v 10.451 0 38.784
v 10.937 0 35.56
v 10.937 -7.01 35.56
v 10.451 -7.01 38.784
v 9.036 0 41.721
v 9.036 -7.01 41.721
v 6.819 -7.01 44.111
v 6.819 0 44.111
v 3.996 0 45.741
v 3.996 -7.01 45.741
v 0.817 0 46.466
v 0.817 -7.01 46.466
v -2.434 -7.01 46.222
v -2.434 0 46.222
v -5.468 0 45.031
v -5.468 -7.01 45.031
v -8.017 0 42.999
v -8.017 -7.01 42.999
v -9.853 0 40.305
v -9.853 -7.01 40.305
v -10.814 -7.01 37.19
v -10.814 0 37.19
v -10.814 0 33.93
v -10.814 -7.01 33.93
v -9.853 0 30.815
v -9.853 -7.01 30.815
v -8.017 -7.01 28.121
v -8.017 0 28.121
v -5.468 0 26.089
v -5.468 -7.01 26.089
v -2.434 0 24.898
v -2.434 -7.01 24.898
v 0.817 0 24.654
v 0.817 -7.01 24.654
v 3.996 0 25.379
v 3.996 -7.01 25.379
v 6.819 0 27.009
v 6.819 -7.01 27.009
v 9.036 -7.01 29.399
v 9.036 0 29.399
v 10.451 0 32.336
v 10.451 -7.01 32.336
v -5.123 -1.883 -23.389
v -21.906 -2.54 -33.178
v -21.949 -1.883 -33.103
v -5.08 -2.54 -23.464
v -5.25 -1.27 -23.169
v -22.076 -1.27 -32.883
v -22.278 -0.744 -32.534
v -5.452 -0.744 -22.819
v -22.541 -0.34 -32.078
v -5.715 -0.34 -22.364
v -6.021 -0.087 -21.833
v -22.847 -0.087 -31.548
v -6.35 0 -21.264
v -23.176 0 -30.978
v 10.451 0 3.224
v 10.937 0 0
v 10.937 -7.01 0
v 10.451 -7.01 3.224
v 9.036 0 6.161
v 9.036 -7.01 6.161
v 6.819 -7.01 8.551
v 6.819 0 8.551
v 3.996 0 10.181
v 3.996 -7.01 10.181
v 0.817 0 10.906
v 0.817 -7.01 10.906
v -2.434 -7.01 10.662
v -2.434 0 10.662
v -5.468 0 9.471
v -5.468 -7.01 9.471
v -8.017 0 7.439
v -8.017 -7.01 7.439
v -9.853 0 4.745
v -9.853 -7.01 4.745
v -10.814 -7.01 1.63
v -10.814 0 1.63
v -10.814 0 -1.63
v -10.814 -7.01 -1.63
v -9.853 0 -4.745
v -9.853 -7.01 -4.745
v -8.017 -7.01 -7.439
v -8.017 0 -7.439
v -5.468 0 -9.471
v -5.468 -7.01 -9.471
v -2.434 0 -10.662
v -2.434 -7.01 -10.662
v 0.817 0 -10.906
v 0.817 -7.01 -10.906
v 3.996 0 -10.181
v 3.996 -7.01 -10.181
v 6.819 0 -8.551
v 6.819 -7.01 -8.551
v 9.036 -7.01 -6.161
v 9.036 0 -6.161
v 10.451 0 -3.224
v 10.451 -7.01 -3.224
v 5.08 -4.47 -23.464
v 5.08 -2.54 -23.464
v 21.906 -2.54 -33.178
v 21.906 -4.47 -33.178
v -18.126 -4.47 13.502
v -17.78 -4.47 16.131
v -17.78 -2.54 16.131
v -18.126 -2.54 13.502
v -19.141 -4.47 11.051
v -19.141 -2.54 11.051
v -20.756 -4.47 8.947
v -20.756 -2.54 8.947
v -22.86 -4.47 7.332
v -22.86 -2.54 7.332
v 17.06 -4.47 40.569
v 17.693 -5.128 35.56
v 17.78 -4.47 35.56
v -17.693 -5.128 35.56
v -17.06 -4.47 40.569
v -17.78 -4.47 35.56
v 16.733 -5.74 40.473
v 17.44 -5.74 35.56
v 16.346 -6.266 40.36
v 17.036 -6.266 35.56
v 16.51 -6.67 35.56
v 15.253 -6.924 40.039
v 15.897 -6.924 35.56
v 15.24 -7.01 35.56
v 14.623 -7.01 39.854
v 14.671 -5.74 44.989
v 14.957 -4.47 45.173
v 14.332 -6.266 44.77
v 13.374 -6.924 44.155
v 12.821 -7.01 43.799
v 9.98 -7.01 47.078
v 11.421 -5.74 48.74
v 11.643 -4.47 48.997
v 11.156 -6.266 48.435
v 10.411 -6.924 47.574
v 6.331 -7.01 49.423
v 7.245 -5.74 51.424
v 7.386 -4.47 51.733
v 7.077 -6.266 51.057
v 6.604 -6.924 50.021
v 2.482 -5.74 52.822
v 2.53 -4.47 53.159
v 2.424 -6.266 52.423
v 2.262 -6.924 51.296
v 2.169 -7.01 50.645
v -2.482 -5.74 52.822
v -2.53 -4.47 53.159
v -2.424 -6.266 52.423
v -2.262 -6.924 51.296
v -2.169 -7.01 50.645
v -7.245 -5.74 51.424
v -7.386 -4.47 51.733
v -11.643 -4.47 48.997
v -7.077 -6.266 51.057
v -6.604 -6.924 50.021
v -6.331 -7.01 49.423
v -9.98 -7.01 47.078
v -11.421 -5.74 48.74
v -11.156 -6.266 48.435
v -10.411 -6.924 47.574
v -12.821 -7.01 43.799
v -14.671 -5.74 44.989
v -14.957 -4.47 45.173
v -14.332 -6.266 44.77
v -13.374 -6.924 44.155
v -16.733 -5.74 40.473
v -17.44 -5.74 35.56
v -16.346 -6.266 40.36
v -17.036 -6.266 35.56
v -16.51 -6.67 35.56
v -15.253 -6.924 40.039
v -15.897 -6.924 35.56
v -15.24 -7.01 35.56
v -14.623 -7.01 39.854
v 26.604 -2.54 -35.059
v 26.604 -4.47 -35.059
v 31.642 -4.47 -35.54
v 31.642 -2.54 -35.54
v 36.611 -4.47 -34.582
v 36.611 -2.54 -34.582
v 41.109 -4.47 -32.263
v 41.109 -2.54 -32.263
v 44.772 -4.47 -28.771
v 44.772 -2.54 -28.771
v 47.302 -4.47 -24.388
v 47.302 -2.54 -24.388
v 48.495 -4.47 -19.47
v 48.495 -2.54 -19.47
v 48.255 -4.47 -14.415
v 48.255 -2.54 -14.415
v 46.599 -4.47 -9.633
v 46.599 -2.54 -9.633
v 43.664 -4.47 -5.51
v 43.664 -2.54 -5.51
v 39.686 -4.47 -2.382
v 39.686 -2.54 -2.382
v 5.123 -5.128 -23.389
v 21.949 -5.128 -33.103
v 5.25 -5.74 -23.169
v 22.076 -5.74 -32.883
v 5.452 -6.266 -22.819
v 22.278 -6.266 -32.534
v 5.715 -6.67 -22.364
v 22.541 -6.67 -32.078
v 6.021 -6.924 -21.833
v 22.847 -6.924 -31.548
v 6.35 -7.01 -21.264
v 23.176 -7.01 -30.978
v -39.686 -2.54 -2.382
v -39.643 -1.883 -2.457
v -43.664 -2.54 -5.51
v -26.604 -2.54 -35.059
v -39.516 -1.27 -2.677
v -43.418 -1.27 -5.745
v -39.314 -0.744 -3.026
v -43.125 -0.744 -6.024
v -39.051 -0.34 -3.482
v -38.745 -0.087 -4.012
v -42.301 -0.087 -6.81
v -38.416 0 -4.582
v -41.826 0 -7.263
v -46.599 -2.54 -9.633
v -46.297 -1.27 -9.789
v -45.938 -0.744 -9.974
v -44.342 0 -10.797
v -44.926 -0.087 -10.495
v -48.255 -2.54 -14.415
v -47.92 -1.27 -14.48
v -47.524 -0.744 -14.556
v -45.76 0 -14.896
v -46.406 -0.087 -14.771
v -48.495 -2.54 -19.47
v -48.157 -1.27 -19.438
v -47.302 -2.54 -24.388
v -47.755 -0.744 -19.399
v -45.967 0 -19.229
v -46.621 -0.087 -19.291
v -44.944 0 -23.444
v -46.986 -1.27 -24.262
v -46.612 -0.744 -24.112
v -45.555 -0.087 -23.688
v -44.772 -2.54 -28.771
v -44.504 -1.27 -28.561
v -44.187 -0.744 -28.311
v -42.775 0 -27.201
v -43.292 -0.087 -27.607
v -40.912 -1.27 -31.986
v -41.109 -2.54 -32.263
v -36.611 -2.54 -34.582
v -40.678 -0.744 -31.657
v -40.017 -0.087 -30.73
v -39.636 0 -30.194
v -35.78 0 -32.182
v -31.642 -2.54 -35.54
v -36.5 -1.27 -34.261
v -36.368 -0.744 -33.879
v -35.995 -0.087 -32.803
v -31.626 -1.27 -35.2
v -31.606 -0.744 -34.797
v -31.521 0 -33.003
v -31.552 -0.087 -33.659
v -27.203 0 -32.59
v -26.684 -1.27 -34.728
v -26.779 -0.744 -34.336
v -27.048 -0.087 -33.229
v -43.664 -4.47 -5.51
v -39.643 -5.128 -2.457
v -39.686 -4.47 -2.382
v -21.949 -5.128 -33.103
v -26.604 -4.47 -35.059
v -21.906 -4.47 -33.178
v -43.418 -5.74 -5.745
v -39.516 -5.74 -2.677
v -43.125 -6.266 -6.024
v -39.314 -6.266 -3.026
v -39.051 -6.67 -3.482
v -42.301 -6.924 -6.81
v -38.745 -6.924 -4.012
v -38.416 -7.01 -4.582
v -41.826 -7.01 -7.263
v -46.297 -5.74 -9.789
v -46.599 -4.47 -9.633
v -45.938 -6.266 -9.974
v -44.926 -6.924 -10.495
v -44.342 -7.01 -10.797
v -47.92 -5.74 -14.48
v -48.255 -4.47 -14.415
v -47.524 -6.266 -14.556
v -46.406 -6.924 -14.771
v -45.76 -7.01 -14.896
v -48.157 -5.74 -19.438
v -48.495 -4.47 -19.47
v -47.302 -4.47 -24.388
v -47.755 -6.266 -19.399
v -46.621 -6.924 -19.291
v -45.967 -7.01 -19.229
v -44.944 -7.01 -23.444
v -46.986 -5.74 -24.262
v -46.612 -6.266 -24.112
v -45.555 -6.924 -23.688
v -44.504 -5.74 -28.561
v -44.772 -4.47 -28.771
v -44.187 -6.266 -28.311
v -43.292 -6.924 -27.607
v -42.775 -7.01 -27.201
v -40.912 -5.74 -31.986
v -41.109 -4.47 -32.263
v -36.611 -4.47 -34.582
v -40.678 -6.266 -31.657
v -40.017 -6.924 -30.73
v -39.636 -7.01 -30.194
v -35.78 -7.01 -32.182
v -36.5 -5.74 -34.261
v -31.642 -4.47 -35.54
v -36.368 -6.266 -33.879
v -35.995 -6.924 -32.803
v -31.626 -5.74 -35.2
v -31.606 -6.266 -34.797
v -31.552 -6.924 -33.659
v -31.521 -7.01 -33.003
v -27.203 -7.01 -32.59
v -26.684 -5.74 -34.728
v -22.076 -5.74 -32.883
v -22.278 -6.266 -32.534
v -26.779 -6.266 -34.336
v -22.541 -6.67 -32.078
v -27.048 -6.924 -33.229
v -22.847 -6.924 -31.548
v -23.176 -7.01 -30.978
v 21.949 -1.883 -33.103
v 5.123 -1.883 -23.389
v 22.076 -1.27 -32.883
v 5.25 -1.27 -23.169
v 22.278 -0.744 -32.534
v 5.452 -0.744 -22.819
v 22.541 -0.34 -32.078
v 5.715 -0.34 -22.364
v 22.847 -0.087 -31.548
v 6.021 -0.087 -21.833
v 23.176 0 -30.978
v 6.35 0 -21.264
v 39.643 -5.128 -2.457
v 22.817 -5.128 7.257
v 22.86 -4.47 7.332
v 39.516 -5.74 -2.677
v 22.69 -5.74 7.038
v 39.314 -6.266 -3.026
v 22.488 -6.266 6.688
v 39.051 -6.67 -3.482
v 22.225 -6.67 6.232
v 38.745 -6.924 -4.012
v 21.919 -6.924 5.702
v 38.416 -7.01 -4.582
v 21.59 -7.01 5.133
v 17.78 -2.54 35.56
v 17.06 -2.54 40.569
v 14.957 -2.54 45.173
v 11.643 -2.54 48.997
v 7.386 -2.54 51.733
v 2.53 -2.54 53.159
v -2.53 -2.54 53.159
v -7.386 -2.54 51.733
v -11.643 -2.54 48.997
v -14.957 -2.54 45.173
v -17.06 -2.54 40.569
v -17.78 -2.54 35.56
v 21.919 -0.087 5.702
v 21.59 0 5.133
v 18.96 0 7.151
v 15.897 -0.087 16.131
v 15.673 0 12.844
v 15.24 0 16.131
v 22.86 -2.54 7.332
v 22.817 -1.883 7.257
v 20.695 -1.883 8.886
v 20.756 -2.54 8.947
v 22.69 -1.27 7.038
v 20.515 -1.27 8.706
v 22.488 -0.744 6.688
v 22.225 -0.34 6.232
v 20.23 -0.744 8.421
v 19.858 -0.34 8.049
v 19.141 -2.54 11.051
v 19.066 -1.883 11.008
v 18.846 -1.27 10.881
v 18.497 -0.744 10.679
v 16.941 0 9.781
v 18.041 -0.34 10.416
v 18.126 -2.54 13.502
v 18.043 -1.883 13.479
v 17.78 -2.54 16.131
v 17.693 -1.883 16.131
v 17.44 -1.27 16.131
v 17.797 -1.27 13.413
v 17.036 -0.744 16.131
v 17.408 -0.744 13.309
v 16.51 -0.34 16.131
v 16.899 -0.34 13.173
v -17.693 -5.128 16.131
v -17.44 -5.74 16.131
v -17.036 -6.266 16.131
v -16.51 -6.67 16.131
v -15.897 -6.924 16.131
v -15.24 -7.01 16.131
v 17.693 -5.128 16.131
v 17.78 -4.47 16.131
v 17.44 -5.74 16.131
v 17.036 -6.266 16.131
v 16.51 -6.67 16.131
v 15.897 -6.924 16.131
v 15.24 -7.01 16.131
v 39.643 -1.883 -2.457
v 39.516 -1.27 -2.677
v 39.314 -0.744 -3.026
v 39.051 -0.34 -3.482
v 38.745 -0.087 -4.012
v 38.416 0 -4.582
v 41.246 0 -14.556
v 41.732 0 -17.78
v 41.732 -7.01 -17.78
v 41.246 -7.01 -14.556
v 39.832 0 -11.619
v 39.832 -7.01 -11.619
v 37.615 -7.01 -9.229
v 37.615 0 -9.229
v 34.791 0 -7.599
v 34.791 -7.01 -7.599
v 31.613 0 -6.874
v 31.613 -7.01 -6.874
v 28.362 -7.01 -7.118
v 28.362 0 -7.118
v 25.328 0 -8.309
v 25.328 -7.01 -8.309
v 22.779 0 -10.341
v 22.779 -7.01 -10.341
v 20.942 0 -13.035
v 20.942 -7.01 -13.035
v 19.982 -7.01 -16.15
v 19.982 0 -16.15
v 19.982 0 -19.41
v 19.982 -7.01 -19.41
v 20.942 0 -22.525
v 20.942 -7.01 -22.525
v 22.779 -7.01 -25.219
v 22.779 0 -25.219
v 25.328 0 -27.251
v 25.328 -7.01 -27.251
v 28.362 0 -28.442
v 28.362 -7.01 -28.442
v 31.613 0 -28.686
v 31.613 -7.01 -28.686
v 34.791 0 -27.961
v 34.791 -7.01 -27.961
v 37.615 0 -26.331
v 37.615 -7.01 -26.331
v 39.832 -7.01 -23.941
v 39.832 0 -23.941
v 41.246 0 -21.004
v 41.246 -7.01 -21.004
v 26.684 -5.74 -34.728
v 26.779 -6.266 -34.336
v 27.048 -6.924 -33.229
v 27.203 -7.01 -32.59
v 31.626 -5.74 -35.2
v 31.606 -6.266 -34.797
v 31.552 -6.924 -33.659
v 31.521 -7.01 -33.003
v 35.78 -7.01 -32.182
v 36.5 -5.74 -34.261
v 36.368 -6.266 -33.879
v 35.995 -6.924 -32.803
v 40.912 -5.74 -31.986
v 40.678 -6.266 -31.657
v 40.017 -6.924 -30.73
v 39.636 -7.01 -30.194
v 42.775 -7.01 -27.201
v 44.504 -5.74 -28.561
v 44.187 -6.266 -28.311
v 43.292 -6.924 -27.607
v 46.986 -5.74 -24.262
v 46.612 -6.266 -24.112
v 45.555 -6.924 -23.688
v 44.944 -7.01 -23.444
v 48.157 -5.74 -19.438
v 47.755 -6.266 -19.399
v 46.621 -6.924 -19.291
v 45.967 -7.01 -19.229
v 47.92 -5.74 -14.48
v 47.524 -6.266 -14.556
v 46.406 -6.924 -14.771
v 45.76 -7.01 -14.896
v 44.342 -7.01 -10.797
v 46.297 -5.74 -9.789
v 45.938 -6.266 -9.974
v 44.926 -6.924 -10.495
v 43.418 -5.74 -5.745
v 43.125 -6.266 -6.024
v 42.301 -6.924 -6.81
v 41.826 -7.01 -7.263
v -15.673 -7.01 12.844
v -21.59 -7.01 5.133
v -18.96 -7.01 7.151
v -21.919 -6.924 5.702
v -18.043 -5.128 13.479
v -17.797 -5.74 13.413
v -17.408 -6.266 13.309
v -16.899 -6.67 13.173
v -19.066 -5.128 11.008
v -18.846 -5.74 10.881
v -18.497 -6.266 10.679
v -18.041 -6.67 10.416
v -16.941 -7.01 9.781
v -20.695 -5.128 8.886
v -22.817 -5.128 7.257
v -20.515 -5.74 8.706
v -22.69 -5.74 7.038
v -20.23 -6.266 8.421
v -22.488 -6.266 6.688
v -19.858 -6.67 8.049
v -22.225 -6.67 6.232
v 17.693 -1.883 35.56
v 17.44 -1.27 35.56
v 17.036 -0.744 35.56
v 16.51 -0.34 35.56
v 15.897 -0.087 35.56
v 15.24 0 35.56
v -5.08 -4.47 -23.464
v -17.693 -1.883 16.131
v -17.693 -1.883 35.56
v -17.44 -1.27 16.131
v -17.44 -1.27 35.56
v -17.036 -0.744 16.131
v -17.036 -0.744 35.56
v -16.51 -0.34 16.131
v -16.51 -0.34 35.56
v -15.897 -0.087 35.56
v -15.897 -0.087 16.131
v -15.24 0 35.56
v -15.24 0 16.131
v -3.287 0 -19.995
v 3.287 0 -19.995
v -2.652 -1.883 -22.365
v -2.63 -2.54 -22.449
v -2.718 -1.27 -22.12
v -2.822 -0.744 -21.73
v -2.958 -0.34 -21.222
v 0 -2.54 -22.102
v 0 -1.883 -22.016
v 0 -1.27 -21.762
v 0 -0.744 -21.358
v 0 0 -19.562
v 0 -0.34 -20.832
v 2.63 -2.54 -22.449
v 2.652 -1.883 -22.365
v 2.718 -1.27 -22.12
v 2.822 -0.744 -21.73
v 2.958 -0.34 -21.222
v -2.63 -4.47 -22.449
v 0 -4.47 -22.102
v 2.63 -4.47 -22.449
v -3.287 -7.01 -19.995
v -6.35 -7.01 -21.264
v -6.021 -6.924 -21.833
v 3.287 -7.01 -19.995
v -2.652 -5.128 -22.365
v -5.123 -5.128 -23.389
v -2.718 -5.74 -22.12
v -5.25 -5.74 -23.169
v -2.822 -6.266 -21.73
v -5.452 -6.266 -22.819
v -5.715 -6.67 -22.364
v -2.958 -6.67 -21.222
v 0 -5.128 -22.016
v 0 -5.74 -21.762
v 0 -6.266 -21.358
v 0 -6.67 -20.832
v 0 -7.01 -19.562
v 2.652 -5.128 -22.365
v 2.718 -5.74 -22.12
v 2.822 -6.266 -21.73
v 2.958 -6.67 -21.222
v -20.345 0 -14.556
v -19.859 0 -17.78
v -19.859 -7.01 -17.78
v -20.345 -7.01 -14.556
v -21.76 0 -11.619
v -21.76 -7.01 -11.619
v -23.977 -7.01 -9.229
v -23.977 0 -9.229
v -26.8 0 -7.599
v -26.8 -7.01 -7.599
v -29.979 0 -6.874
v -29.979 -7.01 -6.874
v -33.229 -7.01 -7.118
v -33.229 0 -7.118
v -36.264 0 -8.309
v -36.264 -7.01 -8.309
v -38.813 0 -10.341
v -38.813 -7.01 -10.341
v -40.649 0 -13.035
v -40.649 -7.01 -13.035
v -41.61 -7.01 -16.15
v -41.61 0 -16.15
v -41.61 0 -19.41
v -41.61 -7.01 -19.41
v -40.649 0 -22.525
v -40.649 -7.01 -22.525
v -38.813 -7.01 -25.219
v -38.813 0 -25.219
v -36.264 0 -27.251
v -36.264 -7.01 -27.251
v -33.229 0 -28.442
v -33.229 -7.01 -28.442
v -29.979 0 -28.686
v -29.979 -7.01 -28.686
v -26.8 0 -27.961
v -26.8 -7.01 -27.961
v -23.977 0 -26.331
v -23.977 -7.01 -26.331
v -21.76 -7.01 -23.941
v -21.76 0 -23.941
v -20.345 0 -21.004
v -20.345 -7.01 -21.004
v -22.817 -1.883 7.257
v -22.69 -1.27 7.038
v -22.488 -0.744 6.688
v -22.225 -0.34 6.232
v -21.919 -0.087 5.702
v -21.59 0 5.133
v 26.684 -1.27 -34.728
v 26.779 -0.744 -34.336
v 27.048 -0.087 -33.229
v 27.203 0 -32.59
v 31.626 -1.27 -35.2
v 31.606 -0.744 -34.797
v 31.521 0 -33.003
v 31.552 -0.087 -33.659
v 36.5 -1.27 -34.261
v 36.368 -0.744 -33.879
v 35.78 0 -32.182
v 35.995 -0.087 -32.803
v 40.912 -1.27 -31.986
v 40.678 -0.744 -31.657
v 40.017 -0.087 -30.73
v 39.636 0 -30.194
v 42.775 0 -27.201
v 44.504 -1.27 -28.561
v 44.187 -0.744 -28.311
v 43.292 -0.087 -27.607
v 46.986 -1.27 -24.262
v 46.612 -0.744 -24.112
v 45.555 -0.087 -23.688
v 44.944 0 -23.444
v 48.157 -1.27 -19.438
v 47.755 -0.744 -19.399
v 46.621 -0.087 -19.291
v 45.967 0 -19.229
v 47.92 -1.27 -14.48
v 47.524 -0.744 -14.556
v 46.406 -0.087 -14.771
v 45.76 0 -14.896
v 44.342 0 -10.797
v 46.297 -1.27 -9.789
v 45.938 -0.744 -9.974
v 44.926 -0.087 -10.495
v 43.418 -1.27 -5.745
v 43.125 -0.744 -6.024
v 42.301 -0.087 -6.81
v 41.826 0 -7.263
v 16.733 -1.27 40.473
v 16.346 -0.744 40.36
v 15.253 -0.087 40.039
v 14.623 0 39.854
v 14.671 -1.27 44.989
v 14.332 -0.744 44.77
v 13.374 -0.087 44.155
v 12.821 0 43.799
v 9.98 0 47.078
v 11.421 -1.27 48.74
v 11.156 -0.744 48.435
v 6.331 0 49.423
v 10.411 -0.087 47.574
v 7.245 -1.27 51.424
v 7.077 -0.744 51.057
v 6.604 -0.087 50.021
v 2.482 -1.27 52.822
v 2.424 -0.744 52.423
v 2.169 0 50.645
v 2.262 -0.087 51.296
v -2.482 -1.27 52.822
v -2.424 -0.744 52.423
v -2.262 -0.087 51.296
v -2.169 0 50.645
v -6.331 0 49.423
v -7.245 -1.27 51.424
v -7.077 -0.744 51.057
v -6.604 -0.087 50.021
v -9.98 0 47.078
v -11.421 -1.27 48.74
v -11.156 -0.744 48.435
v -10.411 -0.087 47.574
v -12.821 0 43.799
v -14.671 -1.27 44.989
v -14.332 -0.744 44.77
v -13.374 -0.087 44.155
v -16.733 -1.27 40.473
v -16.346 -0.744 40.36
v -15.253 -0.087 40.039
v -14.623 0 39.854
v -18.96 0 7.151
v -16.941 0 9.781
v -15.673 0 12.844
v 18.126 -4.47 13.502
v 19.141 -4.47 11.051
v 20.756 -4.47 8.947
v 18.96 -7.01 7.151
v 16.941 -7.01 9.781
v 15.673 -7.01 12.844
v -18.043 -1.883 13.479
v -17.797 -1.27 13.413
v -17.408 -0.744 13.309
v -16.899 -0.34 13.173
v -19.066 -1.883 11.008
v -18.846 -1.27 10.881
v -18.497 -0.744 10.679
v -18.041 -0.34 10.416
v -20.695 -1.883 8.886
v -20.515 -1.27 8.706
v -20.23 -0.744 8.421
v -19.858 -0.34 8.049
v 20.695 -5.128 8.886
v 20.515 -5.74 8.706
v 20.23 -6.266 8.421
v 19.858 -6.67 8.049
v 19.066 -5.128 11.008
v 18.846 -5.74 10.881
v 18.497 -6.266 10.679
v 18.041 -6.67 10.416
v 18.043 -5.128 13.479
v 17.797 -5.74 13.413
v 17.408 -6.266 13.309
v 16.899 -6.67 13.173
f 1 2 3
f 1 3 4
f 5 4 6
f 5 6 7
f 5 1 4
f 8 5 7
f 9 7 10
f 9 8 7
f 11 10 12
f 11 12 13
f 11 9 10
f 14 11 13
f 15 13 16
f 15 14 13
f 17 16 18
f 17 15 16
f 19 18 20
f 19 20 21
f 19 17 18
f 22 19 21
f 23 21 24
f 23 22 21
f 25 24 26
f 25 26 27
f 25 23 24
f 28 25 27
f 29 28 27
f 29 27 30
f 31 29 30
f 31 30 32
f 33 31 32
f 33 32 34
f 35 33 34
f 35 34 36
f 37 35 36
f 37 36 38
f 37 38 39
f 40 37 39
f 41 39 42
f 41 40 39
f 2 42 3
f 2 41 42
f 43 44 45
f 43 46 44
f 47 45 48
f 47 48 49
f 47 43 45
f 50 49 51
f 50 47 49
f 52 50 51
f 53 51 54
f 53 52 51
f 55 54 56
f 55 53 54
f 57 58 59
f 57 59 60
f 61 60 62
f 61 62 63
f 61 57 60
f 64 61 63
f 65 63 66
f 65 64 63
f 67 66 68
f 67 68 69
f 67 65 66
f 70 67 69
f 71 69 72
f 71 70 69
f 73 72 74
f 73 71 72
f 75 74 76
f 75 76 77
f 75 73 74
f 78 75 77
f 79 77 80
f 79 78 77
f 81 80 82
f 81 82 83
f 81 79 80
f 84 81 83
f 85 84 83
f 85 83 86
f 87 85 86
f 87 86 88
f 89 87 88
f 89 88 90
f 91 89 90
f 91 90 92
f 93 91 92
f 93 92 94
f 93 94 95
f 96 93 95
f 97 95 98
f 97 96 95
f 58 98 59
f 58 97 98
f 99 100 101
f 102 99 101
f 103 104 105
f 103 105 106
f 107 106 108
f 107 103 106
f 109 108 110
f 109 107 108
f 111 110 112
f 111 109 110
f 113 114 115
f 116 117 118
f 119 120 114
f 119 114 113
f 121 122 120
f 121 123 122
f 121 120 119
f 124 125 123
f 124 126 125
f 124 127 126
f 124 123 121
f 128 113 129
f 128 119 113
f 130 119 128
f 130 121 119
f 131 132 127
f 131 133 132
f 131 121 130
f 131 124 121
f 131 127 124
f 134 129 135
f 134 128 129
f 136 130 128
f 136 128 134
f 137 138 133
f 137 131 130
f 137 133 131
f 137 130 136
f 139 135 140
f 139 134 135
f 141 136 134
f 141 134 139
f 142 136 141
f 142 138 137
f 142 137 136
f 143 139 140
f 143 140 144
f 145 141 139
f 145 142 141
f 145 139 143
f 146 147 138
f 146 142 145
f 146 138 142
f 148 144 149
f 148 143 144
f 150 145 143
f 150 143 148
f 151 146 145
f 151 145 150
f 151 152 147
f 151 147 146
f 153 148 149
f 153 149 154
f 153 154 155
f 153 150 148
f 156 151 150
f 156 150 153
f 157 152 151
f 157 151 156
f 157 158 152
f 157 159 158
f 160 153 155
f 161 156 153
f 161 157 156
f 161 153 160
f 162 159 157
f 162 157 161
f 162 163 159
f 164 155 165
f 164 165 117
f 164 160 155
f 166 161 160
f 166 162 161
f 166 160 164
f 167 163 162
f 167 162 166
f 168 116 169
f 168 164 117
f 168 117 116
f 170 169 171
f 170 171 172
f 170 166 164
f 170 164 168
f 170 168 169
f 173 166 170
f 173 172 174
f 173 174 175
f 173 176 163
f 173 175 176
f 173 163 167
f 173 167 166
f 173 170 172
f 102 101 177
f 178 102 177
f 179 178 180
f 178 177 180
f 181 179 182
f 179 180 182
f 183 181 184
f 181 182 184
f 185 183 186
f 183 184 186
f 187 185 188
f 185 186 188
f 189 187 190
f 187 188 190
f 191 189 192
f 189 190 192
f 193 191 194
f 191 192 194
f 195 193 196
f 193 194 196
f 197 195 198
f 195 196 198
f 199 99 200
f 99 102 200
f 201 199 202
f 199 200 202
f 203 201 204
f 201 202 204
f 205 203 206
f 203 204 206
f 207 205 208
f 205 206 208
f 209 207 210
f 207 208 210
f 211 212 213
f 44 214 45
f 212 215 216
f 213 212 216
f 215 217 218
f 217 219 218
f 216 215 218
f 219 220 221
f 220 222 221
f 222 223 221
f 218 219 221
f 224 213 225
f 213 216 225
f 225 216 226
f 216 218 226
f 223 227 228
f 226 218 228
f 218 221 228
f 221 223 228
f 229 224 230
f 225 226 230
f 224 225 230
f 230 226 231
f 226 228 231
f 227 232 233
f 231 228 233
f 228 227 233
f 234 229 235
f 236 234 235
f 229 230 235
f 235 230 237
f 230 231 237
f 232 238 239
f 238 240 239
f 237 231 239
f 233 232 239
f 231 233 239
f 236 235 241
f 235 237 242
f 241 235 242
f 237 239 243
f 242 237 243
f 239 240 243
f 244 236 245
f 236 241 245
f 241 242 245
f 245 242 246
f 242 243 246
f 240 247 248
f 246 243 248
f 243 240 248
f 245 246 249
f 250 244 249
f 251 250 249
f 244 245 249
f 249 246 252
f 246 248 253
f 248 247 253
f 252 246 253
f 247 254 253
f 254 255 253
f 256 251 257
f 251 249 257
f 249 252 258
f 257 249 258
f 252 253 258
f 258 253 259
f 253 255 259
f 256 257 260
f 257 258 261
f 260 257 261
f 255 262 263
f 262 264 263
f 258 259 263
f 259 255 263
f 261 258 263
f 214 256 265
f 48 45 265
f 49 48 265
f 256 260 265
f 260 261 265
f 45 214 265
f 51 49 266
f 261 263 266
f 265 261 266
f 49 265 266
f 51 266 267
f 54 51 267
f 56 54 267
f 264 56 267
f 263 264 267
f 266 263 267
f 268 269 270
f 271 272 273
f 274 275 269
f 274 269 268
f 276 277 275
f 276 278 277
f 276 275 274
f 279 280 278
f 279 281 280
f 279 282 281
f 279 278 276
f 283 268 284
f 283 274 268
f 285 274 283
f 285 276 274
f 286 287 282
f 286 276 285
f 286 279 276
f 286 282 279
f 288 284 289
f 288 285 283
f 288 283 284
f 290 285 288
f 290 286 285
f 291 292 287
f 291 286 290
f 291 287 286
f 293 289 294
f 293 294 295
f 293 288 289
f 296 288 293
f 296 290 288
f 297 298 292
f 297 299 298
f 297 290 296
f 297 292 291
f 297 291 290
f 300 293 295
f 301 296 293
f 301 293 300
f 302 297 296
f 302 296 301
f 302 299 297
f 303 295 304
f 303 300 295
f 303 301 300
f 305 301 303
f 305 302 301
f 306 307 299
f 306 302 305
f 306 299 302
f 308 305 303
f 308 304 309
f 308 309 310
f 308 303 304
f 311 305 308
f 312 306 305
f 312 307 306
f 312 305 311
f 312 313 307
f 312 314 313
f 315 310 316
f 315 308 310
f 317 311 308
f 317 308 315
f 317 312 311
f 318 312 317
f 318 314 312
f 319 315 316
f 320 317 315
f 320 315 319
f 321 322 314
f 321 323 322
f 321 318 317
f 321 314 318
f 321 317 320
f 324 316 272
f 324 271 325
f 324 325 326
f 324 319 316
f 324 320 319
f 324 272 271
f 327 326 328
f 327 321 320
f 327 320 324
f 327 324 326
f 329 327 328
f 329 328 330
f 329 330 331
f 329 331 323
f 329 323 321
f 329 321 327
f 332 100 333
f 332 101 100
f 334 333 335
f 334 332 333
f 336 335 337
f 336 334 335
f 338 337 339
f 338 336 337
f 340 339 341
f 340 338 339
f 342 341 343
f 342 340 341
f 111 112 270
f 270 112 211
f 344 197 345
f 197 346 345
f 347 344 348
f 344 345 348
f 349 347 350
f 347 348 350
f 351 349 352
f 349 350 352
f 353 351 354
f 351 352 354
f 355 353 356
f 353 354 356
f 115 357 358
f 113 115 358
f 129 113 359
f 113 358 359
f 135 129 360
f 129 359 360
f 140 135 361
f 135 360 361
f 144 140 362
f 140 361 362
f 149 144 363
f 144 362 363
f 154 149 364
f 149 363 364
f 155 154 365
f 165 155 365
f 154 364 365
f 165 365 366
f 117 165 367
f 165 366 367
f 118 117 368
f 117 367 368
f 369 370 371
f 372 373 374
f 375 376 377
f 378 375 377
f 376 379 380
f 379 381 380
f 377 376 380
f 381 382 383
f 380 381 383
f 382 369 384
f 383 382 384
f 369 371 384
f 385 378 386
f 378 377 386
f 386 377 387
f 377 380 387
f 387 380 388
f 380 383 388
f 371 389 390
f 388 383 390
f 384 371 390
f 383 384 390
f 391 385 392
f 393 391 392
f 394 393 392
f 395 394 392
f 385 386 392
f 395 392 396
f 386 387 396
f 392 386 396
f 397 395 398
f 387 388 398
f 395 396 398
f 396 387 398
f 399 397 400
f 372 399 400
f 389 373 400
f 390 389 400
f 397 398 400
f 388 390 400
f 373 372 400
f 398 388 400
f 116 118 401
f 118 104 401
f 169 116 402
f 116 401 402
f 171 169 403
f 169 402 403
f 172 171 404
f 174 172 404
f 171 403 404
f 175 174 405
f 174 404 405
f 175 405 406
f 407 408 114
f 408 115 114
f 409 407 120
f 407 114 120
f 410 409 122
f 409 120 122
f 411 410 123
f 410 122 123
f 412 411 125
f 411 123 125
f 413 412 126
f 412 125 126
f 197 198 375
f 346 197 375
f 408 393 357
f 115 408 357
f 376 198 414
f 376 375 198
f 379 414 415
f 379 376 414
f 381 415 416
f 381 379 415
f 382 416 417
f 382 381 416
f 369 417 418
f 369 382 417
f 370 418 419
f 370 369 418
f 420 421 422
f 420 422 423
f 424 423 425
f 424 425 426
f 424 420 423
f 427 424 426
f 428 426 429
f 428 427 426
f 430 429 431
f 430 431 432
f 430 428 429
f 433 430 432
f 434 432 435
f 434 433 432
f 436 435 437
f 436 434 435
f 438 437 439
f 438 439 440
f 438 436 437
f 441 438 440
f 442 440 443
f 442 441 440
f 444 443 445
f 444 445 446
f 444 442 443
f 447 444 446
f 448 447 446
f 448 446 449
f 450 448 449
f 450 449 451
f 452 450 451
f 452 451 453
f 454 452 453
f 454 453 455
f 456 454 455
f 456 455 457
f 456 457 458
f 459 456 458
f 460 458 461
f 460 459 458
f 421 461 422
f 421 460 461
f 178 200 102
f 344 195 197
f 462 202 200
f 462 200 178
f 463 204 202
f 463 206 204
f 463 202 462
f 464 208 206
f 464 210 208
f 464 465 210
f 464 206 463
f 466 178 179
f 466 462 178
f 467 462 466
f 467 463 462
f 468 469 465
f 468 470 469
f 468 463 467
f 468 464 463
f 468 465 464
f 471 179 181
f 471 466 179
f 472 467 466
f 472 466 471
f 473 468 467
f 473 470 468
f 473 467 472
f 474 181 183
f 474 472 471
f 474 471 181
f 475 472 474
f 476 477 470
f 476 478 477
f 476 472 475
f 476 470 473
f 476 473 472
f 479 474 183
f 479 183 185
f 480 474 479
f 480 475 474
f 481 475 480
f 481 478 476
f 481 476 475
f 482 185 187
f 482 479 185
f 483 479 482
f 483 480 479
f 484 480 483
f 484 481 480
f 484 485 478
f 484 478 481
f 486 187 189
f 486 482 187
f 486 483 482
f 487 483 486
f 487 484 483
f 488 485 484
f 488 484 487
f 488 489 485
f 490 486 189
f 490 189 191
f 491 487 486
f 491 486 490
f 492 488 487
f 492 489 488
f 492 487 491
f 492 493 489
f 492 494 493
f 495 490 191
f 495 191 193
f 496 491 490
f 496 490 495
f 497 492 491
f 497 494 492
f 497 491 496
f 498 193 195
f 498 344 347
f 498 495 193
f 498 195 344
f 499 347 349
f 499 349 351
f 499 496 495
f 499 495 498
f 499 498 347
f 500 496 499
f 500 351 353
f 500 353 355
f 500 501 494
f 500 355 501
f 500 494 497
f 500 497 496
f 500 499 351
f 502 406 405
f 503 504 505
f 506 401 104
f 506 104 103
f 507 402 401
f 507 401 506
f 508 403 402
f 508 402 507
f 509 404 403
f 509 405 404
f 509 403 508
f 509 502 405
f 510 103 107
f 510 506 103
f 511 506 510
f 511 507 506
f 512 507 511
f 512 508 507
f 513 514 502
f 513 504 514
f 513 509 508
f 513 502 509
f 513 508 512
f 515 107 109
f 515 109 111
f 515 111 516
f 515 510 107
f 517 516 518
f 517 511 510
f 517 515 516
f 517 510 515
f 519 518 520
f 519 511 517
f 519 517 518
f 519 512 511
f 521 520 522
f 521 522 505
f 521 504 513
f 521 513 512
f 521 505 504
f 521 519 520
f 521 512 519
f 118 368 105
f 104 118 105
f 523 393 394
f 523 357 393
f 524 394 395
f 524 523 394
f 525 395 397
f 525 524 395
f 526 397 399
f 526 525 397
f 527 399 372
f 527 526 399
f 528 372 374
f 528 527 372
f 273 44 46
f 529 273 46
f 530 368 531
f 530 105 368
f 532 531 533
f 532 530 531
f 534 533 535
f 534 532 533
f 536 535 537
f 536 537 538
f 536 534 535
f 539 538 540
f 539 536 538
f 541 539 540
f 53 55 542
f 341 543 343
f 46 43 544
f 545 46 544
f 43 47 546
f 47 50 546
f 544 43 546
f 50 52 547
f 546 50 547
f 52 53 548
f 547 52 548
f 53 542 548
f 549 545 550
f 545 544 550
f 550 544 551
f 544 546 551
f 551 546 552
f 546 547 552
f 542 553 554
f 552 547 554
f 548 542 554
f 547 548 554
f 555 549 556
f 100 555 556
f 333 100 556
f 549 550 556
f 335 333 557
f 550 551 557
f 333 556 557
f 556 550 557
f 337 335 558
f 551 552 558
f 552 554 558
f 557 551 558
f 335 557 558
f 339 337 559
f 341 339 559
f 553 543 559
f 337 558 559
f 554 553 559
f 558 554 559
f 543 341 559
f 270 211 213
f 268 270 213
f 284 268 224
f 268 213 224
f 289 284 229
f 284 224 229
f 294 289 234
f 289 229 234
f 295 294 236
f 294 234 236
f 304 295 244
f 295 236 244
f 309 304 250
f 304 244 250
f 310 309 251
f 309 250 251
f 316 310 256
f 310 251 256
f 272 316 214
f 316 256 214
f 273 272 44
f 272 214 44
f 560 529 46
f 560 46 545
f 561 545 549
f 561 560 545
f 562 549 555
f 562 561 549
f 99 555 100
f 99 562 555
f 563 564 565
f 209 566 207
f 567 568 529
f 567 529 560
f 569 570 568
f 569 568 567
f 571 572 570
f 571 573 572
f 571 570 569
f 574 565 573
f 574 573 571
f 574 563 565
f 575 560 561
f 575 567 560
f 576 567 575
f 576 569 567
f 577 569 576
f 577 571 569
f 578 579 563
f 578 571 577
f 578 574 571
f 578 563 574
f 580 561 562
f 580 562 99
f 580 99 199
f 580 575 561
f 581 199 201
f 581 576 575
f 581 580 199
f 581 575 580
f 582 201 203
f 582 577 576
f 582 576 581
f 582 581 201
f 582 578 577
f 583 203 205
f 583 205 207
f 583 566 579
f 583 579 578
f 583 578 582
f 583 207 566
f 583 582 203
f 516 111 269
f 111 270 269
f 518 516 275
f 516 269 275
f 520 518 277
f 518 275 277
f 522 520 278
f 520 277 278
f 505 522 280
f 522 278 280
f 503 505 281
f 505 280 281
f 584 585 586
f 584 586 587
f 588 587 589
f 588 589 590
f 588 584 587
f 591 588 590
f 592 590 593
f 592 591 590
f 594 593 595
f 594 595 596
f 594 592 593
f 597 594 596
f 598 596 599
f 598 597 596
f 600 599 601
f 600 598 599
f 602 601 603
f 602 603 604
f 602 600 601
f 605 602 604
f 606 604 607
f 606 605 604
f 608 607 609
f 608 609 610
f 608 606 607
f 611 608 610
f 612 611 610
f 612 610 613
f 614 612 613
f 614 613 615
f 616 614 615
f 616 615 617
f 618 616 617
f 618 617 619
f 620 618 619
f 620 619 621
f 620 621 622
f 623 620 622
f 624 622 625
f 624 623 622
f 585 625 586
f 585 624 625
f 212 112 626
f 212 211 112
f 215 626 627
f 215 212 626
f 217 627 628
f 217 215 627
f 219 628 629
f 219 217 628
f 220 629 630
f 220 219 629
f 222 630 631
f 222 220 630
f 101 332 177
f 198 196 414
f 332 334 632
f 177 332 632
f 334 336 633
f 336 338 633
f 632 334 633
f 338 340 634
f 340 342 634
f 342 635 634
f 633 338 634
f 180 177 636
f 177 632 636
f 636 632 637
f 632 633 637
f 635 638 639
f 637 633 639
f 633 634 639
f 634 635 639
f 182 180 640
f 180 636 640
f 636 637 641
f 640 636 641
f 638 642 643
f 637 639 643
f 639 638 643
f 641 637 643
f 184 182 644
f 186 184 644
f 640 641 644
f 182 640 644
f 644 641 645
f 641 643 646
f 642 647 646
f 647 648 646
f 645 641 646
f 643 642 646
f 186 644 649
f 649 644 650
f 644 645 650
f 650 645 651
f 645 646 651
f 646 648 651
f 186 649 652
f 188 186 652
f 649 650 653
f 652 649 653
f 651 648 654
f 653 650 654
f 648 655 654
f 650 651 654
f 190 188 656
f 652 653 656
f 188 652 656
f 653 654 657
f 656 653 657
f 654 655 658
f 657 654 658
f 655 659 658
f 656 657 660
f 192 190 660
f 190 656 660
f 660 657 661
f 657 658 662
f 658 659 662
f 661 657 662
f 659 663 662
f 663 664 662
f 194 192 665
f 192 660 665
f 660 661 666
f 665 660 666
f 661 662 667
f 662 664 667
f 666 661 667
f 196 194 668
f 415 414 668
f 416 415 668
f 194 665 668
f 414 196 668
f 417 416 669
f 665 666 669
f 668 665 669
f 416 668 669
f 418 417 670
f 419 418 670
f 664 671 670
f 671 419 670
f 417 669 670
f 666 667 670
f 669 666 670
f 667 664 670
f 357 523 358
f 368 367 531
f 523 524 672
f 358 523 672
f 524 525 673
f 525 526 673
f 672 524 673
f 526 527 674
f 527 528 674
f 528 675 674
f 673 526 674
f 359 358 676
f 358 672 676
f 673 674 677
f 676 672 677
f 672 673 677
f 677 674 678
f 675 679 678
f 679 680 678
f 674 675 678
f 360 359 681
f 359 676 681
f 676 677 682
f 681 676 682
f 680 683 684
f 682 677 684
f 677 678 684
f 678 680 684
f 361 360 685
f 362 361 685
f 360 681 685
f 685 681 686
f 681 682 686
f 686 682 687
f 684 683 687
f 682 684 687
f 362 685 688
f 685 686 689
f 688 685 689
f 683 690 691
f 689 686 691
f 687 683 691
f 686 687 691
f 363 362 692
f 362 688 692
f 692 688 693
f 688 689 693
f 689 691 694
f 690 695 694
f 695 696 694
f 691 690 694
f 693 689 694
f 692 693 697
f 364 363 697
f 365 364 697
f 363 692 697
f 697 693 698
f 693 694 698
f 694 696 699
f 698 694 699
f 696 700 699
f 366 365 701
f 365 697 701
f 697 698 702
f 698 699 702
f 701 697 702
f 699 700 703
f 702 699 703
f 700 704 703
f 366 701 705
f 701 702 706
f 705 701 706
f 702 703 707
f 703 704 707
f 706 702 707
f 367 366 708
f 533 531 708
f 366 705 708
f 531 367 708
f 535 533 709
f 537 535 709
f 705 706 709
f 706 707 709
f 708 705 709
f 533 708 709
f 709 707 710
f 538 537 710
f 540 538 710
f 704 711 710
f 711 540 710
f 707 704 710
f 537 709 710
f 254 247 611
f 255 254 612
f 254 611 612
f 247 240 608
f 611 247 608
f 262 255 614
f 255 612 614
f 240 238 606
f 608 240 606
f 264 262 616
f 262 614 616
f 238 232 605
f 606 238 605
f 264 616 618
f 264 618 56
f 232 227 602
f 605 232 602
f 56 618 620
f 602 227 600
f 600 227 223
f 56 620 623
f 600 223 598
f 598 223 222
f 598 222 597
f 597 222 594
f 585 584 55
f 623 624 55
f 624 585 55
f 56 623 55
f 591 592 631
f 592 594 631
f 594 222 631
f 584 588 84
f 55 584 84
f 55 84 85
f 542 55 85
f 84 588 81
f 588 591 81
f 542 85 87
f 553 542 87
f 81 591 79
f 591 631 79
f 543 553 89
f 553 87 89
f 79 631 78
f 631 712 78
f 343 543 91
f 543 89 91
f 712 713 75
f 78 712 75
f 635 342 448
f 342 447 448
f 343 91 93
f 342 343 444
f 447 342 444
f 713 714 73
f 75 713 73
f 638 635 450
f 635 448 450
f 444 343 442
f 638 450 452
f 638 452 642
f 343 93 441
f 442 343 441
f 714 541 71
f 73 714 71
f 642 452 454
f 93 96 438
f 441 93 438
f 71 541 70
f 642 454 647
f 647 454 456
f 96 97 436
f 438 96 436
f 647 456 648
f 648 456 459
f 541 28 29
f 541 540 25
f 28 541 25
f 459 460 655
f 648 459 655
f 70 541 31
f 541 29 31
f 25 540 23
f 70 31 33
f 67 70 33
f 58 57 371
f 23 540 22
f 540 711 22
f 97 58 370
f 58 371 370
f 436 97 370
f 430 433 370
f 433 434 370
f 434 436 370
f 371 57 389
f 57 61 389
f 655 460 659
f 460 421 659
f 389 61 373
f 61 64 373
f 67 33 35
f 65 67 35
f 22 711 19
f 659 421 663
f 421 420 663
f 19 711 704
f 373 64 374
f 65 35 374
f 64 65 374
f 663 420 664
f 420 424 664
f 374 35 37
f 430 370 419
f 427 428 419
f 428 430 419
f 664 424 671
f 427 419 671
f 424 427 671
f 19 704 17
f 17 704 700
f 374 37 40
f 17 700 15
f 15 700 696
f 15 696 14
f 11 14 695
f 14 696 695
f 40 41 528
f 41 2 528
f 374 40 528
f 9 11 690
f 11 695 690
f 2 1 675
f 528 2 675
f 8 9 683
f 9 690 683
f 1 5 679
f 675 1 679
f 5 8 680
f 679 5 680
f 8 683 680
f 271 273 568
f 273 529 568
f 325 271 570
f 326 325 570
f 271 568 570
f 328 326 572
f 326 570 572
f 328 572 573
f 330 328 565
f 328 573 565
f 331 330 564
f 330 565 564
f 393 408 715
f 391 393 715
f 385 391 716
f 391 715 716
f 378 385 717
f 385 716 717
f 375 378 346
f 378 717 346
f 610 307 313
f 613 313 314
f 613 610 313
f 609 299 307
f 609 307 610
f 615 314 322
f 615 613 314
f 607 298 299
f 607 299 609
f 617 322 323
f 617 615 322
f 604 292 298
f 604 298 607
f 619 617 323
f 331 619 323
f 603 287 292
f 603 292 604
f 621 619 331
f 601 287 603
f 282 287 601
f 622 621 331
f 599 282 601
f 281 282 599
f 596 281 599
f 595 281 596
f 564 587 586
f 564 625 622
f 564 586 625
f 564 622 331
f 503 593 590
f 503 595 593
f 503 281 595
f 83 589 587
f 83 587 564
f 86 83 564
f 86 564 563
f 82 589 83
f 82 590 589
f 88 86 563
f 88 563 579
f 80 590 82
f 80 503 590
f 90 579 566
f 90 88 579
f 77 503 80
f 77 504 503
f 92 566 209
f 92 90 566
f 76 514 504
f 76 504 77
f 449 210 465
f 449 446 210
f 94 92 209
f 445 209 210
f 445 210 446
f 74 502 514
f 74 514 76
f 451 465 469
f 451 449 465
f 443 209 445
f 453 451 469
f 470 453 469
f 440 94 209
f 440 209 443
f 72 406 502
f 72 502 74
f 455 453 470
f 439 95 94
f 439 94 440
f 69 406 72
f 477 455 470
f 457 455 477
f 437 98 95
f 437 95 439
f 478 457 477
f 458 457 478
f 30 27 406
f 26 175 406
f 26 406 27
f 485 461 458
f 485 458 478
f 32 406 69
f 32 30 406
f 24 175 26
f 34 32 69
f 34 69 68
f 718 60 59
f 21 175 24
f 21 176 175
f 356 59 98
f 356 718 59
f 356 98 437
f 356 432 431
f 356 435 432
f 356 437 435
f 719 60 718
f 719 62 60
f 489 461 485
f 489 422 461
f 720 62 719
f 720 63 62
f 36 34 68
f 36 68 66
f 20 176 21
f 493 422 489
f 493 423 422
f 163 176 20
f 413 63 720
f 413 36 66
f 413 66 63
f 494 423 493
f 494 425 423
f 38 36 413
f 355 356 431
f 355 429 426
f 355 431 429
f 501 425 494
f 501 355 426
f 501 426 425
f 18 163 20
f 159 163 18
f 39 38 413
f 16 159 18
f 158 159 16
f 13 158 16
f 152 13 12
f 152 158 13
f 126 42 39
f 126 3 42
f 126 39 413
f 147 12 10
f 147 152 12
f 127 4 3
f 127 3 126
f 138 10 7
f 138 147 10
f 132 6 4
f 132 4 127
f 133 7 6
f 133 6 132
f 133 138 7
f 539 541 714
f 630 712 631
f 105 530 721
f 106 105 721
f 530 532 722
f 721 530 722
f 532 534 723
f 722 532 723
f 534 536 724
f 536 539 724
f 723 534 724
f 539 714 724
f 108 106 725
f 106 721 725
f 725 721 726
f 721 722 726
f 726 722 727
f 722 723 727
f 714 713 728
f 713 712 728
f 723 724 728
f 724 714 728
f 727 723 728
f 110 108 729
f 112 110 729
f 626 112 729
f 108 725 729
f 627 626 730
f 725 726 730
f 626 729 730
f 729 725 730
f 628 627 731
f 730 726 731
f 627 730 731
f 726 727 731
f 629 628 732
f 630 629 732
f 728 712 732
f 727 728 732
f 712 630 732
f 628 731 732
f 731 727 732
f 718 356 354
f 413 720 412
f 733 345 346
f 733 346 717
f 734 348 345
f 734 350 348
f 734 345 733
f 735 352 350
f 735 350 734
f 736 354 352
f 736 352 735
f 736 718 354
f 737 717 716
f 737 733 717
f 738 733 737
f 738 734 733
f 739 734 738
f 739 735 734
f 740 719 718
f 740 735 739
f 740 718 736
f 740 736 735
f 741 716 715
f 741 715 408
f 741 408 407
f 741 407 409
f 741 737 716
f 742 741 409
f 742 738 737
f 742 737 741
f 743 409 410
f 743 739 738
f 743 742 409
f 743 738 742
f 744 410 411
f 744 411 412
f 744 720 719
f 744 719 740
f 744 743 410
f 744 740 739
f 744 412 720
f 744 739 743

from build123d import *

# Parameters (mm, degrees)
F0_R     = 10.936503
F1_DEPTH = 7.0104
F2_R     = 10.16
F3_R     = 2.54


with BuildPart() as f1:
    # F0 (on Front) → F1 (new body)
    with BuildSketch(Plane.XZ):
        with BuildLine():
            Line((-17.78, 35.56), (-17.78, 10.265288))
            Line((-17.78, 10.265288), (-39.685863, -2.382068))
            ThreePointArc((-39.685863, -2.382068), (-46.193795, -26.67), (-21.905863, -33.177932))
            Line((-21.905863, -33.177932), (0, -20.530576))
            Line((0, -20.530576), (21.905863, -33.177932))
            ThreePointArc((21.905863, -33.177932), (46.193795, -26.67), (39.685863, -2.382068))
            Line((39.685863, -2.382068), (17.78, 10.265288))
            Line((17.78, 10.265288), (17.78, 35.56))
            ThreePointArc((17.78, 35.56), (0, 53.34), (-17.78, 35.56))
        make_face()
        with Locations((-30.795863, -17.78)):
            Circle(F0_R, mode=Mode.SUBTRACT)
        with Locations((30.795863, -17.78)):
            Circle(F0_R, mode=Mode.SUBTRACT)
        Circle(F0_R, mode=Mode.SUBTRACT)
        with Locations((0, 35.56)):
            Circle(F0_R, mode=Mode.SUBTRACT)
    extrude(amount=F1_DEPTH)

    # F2
    f2_edges = [f1.edges().sort_by_distance(p)[0] for p in [
        (17.78, -3.5052, 10.265288),
        (-17.78, -3.5052, 10.265288),
        (0, -3.5052, -20.530576),
    ]]
    fillet(f2_edges, radius=F2_R)

    # F3
    f3_edges = [f1.edges().sort_by_distance(p)[0] for p in [
        (-17.78, -7.0104, 25.845583),
        (-17.78, 0, 25.845583),
    ]]
    fillet(f3_edges, radius=F3_R)


solid = f1.part
